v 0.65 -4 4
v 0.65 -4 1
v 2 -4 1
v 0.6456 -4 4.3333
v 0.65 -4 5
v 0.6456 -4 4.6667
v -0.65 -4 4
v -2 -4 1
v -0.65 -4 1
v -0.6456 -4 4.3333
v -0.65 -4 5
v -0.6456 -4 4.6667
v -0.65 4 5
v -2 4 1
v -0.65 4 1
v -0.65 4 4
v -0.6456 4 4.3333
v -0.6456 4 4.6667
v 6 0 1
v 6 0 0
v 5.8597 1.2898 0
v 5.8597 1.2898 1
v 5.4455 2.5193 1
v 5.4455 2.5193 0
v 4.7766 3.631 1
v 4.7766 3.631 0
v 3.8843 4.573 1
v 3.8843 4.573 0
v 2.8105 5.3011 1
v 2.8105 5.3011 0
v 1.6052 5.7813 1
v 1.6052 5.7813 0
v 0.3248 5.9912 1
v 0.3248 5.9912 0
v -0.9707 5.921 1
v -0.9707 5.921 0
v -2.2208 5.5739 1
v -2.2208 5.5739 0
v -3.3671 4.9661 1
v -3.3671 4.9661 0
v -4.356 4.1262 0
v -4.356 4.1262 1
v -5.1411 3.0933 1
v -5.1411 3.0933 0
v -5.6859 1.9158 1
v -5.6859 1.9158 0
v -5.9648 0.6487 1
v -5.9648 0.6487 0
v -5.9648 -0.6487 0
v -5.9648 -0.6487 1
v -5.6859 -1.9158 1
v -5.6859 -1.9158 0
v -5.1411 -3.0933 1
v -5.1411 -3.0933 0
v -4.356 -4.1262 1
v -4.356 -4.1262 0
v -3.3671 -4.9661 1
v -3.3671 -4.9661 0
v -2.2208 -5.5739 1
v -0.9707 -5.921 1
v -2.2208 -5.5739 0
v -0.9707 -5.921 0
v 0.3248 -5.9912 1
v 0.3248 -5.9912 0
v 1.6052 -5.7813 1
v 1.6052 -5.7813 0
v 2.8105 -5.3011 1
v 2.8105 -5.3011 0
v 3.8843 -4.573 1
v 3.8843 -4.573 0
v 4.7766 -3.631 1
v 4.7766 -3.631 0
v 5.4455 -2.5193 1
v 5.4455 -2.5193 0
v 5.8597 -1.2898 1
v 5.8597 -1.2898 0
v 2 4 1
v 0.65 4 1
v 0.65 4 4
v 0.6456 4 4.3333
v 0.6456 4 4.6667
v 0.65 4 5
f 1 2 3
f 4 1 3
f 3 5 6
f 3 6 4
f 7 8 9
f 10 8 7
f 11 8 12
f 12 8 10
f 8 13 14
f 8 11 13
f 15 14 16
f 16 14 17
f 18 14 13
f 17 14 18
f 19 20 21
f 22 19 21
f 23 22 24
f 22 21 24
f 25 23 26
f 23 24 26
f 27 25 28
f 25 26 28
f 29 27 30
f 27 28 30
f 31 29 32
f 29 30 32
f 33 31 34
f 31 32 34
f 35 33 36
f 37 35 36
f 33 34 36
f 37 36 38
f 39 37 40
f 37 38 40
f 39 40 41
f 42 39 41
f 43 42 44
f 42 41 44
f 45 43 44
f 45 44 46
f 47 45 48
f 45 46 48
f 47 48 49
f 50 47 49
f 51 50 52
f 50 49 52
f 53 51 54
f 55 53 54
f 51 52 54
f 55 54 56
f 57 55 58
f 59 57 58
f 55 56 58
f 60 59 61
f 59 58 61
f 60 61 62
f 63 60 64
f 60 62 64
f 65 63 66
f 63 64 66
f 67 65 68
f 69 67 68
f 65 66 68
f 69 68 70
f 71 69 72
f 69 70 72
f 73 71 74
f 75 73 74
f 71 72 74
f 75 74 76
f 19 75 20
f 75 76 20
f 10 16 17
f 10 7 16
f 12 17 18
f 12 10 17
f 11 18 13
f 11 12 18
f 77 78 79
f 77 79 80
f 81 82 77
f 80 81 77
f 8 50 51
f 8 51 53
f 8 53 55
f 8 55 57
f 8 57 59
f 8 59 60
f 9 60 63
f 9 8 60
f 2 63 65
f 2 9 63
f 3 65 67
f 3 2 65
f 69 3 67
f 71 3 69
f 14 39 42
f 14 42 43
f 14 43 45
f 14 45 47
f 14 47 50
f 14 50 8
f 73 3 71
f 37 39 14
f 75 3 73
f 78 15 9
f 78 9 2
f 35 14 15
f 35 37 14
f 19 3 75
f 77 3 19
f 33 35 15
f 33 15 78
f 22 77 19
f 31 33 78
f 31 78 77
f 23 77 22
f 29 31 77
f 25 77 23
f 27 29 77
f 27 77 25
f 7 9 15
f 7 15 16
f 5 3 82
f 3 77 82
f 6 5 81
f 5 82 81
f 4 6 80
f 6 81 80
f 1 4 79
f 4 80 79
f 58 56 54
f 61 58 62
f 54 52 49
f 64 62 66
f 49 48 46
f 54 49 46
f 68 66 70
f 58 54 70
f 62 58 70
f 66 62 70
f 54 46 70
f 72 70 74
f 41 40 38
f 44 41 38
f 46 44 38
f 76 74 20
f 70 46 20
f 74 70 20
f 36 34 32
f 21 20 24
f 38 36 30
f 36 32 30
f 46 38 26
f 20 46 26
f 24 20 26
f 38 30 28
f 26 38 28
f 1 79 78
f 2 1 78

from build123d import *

# Parameters (mm, degrees)
F0_R     = 6
F1_DEPTH = 1
F3_DEPTH = 4


with BuildPart() as f1:
    # F0 (on Top) → F1 (new body)
    with BuildSketch(Plane.XY):
        Circle(F0_R)
    extrude(amount=F1_DEPTH)

    # F2 (on Front) → F3 (join, symmetric)
    with BuildSketch(Plane.XZ):
        Polygon((0.65, 4), (0.65, 1), (2, 1), (0.65, 5), align=None)
        Polygon((-0.65, 5), (-2, 1), (-0.65, 1), (-0.65, 4), align=None)
        with BuildLine():
            ThreePointArc((-0.65, 4), (-0.645, 4.5), (-0.65, 5))
            Line((-0.65, 5), (-0.65, 4))
        make_face()
        with BuildLine():
            ThreePointArc((0.65, 5), (0.645, 4.5), (0.65, 4))
            Line((0.65, 4), (0.65, 5))
        make_face()
    extrude(amount=F3_DEPTH, both=True)


solid = f1.part
